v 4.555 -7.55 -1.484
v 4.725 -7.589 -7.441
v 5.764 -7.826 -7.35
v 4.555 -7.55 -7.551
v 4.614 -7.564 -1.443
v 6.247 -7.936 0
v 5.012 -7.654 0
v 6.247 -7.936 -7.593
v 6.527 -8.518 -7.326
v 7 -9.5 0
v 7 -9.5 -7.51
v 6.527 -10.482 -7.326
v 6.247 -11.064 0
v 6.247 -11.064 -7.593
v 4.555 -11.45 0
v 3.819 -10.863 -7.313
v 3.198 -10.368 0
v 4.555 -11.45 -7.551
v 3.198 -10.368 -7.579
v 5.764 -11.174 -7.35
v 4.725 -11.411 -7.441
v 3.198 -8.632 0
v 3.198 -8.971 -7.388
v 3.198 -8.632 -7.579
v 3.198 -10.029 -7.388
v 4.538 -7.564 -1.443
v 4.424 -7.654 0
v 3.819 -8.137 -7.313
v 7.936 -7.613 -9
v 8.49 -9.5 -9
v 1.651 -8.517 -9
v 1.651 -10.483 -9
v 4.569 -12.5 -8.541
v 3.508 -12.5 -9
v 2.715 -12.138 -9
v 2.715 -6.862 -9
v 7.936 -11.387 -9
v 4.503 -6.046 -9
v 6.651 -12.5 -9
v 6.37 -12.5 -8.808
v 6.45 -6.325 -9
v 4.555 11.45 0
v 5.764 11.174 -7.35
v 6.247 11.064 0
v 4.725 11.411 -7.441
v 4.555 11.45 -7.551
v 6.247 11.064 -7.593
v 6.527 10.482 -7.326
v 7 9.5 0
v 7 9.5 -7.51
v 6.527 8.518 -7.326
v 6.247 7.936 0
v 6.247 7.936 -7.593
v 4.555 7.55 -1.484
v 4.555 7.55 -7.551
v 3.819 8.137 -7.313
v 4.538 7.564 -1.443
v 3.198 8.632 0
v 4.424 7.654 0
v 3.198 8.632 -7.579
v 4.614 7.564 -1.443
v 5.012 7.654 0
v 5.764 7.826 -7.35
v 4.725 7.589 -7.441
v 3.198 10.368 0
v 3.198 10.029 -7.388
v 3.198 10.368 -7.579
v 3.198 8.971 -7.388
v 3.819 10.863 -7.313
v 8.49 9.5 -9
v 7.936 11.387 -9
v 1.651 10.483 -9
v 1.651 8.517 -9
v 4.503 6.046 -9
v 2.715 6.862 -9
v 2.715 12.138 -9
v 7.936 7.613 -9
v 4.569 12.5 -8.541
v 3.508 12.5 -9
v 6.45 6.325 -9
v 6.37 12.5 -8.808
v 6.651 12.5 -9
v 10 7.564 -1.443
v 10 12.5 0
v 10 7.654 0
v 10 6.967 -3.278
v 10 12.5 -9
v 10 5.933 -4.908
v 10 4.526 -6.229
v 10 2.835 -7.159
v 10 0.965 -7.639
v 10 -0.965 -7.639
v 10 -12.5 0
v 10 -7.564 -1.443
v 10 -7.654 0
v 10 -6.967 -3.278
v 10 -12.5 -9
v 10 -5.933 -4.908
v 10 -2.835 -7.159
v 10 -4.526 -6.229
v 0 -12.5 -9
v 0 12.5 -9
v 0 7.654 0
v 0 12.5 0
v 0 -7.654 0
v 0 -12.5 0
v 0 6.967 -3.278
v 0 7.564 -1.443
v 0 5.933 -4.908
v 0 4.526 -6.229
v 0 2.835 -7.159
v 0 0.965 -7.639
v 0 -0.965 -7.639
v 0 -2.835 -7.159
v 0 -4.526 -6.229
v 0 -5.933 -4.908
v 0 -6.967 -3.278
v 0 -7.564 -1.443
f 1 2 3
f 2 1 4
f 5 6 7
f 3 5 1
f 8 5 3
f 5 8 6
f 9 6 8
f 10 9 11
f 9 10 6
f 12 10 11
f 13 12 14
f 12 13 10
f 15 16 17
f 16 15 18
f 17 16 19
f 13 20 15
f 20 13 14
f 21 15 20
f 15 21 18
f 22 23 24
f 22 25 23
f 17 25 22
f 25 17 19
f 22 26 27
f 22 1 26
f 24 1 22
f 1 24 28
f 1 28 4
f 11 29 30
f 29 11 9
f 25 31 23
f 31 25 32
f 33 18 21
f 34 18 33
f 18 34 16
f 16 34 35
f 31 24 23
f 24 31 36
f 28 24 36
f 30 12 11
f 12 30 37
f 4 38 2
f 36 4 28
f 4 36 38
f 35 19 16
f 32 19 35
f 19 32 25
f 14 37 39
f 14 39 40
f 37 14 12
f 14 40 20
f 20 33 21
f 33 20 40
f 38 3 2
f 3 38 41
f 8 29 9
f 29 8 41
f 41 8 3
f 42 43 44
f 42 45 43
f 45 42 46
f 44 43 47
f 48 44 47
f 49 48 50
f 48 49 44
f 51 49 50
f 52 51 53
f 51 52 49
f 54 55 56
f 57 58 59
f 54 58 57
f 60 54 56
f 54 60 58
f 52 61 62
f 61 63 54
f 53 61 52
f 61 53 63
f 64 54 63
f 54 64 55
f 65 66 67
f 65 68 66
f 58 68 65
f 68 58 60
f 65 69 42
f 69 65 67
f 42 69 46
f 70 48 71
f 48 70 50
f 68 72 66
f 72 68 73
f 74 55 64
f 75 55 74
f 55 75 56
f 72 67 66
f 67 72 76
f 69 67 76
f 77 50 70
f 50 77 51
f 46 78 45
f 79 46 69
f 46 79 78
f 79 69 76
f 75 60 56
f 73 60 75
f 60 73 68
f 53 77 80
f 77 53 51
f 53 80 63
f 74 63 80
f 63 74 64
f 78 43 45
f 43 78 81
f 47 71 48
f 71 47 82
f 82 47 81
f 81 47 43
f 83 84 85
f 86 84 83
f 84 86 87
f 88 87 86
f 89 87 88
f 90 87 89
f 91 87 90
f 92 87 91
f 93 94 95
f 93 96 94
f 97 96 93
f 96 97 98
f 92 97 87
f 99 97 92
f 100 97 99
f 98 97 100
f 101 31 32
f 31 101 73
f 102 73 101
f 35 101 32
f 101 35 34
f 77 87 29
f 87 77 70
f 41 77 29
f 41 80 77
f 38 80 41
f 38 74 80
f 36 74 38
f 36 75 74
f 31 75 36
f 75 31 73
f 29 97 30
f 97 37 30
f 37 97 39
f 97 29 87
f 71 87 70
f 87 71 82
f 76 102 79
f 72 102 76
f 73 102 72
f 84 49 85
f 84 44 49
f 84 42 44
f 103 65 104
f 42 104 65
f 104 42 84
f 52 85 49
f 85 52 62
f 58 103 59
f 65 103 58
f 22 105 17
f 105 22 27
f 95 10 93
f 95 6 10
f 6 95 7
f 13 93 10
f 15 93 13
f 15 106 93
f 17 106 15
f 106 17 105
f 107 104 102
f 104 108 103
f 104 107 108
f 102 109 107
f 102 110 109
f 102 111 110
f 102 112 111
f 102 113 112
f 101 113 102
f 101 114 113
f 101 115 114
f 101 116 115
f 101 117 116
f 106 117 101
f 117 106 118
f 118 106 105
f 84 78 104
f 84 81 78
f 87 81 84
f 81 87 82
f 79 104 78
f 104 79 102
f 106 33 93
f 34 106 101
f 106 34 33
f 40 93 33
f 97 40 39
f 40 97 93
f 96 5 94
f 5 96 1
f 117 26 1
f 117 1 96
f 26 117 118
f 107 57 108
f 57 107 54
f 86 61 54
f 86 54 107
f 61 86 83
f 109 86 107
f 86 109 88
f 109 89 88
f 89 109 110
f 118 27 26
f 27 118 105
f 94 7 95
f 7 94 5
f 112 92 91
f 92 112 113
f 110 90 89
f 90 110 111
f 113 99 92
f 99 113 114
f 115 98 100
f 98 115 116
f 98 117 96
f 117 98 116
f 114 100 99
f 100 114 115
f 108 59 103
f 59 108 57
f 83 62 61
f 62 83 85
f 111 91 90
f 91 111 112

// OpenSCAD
// file: ../inc/functions.scad
// PRUSA iteration3
// Functions used in many files
// GNU GPL v3
// Josef Průša <josefprusa@me.com>
// Václav 'ax' Hůla <axtheb@gmail.com>
// Vlnofka <>
// http://www.reprap.org/wiki/Prusa_Mendel
// http://github.com/prusajr/PrusaMendel


module nut(d,h,horizontal=true){
    cornerdiameter =  (d / 2) / cos (180 / 6);
    cylinder(h = h, r = cornerdiameter, $fn = 6);
    if(horizontal){
        for(i = [1:6]){
            rotate([0,0,60*i]) translate([-cornerdiameter-0.2,0,0]) rotate([0,0,-45]) cube([2,2,h]);
        }
    }
}

module fillet(radius, height=100, $fn=0) {
    //this creates acutal fillet
    translate([-radius, -radius, -height / 2 - 0.02]) difference() {
        cube([radius * 2, radius * 2, height + 0.04]);
        if ($fn == 0 && (radius == 2 || radius == 3 || radius == 4)) {
            cylinder(r=radius, h=height + 0.04, $fn=4 * radius);
        } else {
            cylinder(r=radius, h=height + 0.04, $fn=$fn);
        }

    }
}

module cube_fillet(size, radius=-1, vertical=[3,3,3,3], top=[0,0,0,0], bottom=[0,0,0,0], center=false, $fn=0){
    //
    if (use_fillets == 1) {
        if (center) {
            cube_fillet_inside(size, radius, vertical, top, bottom, $fn);
        } else {
            translate([size[0]/2, size[1]/2, size[2]/2])
                cube_fillet_inside(size, radius, vertical, top, bottom, $fn);
        }
    } else {
        if (use_fillets == 2) {
            if (center) {
                cube_fillet_inside(size, radius, vertical, top, bottom, 4);
            } else {
                translate([size[0]/2, size[1]/2, size[2]/2])
                    cube_fillet_inside(size, radius, vertical, top, bottom, 4);
            }

        } else {
            cube(size, center);
        }
    }

}

module cube_negative_fillet(size, radius=-1, vertical=[3,3,3,3], top=[0,0,0,0], bottom=[0,0,0,0], $fn=0){

    j=[1,0,1,0];

    for (i=[0:3]) {
        if (radius > -1) {
            rotate([0, 0, 90*i]) translate([size[1-j[i]]/2, size[j[i]]/2, 0]) fillet(radius, size[2], $fn=$fn);
        } else {
            rotate([0, 0, 90*i]) translate([size[1-j[i]]/2, size[j[i]]/2, 0]) fillet(vertical[i], size[2], $fn=$fn);
        }
        rotate([90*i, -90, 0]) translate([size[2]/2, size[j[i]]/2, 0 ]) fillet(top[i], size[1-j[i]], $fn=$fn);
        rotate([90*(4-i), 90, 0]) translate([size[2]/2, size[j[i]]/2, 0]) fillet(bottom[i], size[1-j[i]], $fn=$fn);

    }
}

module cube_fillet_inside(size, radius=-1, vertical=[3,3,3,3], top=[0,0,0,0], bottom=[0,0,0,0], $fn=0){
    //makes CENTERED cube with round corners
    // if you give it radius, it will fillet vertical corners.
    //othervise use vertical, top, bottom arrays
    //when viewed from top, it starts in upper right corner (+x,+y quadrant) , goes counterclockwise
    //top/bottom fillet starts in direction of Y axis and goes CCW too


    if (radius == 0) {
        cube(size, center=true);
    } else {
        difference() {
            cube(size, center=true);
            cube_negative_fillet(size, radius, vertical, top, bottom, $fn);
        }
    }
}


module nema17(places=[1,1,1,1], size=15.5, h=10, holes=false, shadow=false, $fn=24){
    for (i=[0:3]) {
        if (places[i] == 1) {
            rotate([0, 0, 90*i]) translate([size, size, 0]) {
                if (holes) {
                    rotate([0, 0, -90*i])  translate([0,0,-10]) screw(r=1.7, slant=false, head_drop=13, $fn=$fn, h=h+12);
                } else {
                    rotate([0, 0, -90*i]) cylinder(h=h, r=5.5, $fn=$fn);
                }
            }
        }
    }
    if (shadow != false) {
        %translate ([0, 0, shadow+21+3]) cube([42,42,42], center = true);
    //flange
        %translate ([0, 0, shadow+21+3-21-1]) cylinder(r=11,h=2, center = true, $fn=20);
    //shaft
        %translate ([0, 0, shadow+21+3-21-7]) cylinder(r=2.5,h=14, center = true);
    }
}

module screw(h=20, r=2, r_head=3.5, head_drop=0, slant=i_am_box, poly=false, $fn=0){
    //makes screw with head
    //for substraction as screw hole
    if (poly) {
        cylinder_poly(h=h, r=r, $fn=$fn);
    } else {
        cylinder(h=h, r=r, $fn=$fn);
    }
    if (slant) {
        translate([0, 0, head_drop-0.01]) cylinder(h=r_head, r2=0, r1=r_head, $fn=$fn);
    }

    if (head_drop > 0) {
        translate([0, 0, -0.01]) cylinder(h=head_drop+0.01, r=r_head, $fn=$fn);
    }
}

module plate_screw(long=0) {
    if (i_am_box == 0) {
        translate([0, 0, -long]) screw(head_drop=14 + long, h=30 + long, r_head=3.6, r=1.7, $fn=24, slant=false);
    } else {
        translate([0, 0, -2 - long]) screw(head_drop=14 + long, h=30 + long, r_head=4.5, r=2, $fn=24, slant=true);
    }
}

//radius of the idler assembly (to surface that touches belt, ignoring guide walls)
function idler_assy_r_inner(idler_bearing) = (idler_bearing[0] / 2) + (6 * single_wall_width + 0.2) * idler_bearing[3];
//outer radius of the idler assembly (to smooth side of belt) 
function idler_assy_r_outer(idler_bearing) = idler_assy_r_inner(idler_bearing) + belt_thickness + 1;


module idler_assy(idler_bearing = [22, 7, 8, 1]) {

    //bearing axle
    translate([0,0,-1]) cylinder(h = 120, r=(idler_bearing[2] + 1) / 2, $fn=small_hole_segments, center=true);
    //bearing shadow
    %cylinder(h = idler_bearing[1], r=idler_bearing[0]/2, center=true);
    //belt shadow
    %cylinder(h = belt_width, r=idler_assy_r_outer(idler_bearing), center=true);

    cylinder(h = idler_width + 1, r=idler_assy_r_outer(idler_bearing) + 0.5, center=true);
}

module belt(len, side = 0){
    //belt. To be substracted from model
    //len is in +Z, smooth side in +X, Y centered
    translate([-0.5, 0, 0]) maketeeth(len);
    translate([0, -4.5, -0.01]) cube([belt_thickness, 9, len + 0.02]);
    if (side != 0) {
    translate([0, -4.5 + side, -0.01]) cube_fillet([belt_thickness, 9, len + 0.02], vertical = [3, 0, 0, 0]);
    }
}


module maketeeth(len){
    //Belt teeth. 
    for (i = [0 : len / belt_tooth_distance]) {
        translate([0, 0, i * belt_tooth_distance]) cube([2, 9, belt_tooth_distance * belt_tooth_ratio], center = true);
    }
}
// file: ../inc/conf_bushing.scad
// PRUSA iteration3
// Bushing and bering dimensions
// GNU GPL v3
// Václav 'ax' Hůla <axtheb@gmail.com>
// http://www.reprap.org/wiki/Prusa_Mendel
// http://github.com/prusajr/PrusaMendel
//

// each config is in form[r_rod, r, h, type, name] where:
//     r_rod  is smooth rod radius [0]
//     r is outer bushing radius needed for tight fit or bearing radius with loose fit [1]
//     h is barrel length [2]
//     type is 0 for linear bearings, 1 is for bushings which needs to be enclosed fully. [3]
//       type 1 may have flange, but type 0 not
//     name is human readable name [4]

//bushings
conf_b_bushing8 = [4, 5.1, 10, 1, "Tube shaped bushing like igus J(V)FM 0810-10"];
conf_b_bushing10 = [5, 6.1, 10, 1, "Tube shaped bushing with id=10mm, od=12mm and length of at least 10mm, like J(V)FM 1012-10"];
conf_b_bushing12 = [6, 7.1, 15, 1, "Tube shaped bushing with id=12mm, od=14mm and length of at least 15mm, like SF-1 1215"];

conf_b_bronze8 = [4, 8, 11, 1, "bronze self-aligning bushing, 8mm"];

//shorter beaings (two on each Z axis)
conf_b_lm8uu = [4, 7.7, 24, 0, "lm8uu bearing (standard)"];
conf_b_lm10uu = [5, 9.7, 29, 0, "lm10uu bearing (10mm smooth rod)"];
conf_b_lme8uu =[4, 8.2, 25, 0, "lme8uu bearing"];
conf_b_lm12uu = [6, 10.6, 30, 0, "lm12uu bearing (12mm smooth rod)"];

//longer bearings
conf_b_lm8luu = [4, 7.7, 45, 0, "lm8luu bearing (double length)"];
conf_b_lm10luu = [5, 9.7, 55, 0, "lm10luu bearing (10mm smooth rod, long)"];
conf_b_lm12luu = [6, 10.6, 57, 0, "lm12luu bearing (12mm, double length)"];


// Select idler bearing size **************************************************
// [outer_diameter, width, inner_diameter, uses_guide]

// roughly sorted by desirability

// one bearing with guides
// Select by availability, smaller is better.
bearing_623 = [10, 4, 3, 1, "623 bearing"];
bearing_624 = [13, 5, 4, 1, "624 bearing"];
bearing_625 = [16, 5, 5, 1, "625 bearing"];

// two bearings side by side - for use without bearing guides.
// Not recomended anymore
bearing_625_double = [16, 10, 5, 0, "625 bearing x2"];
bearing_624_double = [13, 10, 4, 0, "624 bearing x2"];
bearing_623_double = [10, 8, 3, 0, "623 bearing"];

// 608 [standard skate bearings] with bearing guide
bearing_608 = [22, 7, 8, 1, "608 bearing"];
// 608 bearings with fender washers.
// the belt brushes both against the carriage and the washers.
bearing_608_washers = [22, 10, 8, 0, "608 bearing"];
// file: ../inc/metric.scad
// PRUSA iteration3
// Default metric sizes
// GNU GPL v3
// Josef Průša <josefprusa@me.com>
// http://www.reprap.org/wiki/Prusa_Mendel
// http://github.com/prusajr/PrusaMendel

// DONT CHANGE THIS FILE! ALTER VALUES IN CONFIGURATION.SCAD INSTEAD

// RODS

threaded_rod_diameter = 8.7;
threaded_rod_diameter_horizontal = 8.7;
smooth_bar_diameter = 8;
smooth_bar_diameter_horizontal = 8.5;

// Nuts and bolts

m8_diameter = 9;
m8_nut_diameter = 14.1;

m4_diameter = 4.5;
m4_nut_diameter = 9;
m4_nut_diameter_horizontal = 10;

m3_diameter = 3.6;
m3_nut_diameter = 5.3;
m3_nut_diameter_horizontal = 6.8;
m3_washer_diameter = 6.9;

// Motors

motor_shaft = 5.5;
// file: ../configuration.scad
// PRUSA iteration3
// Configuration file
// GNU GPL v3
// Josef Průša <josefprusa@me.com>
// Václav 'ax' Hůla <axtheb@gmail.com>
// http://www.reprap.org/wiki/Prusa_Mendel
// http://github.com/prusajr/PrusaMendel

include <inc/metric.scad>;
include <inc/conf_bushing.scad>;

// Custom settings here, tailor to your supplies and print settings


// Extruder settings **********************************************************
// Don't forget to set your slicer's extruder settings to match the values you
// enter here.

layer_height = 0.3;
// Width over thickness determines how wide the plastic will be when extruded
// onto the object that is being printed. width_over_thickness is multiplied
// by the layer_height to calculate this width. i.e. If your layer_height is
// set to 0.3 mm and your width_over_thickness is set to 2.2, the resulting
// width will be 0.66 mm.
width_over_thickness = 2.2;

// Select your belt type ******************************************************

//T2.5
//belt_tooth_distance = 2.5;
//belt_tooth_ratio = 0.75;

//T5 (strongly discouraged)
//belt_tooth_distance = 5;
//belt_tooth_ratio = 0.75;

//HTD3
belt_tooth_distance = 3;
belt_tooth_ratio = 0.75;

//MXL
//belt_tooth_distance = 2.032;
//belt_tooth_ratio = 0.64;

//GT2 there is bunch of GT2 belts with different tooth-to-tooth distance
//adjust to your needs
//belt_tooth_distance = 2;
//belt_tooth_ratio = 0.5;

// For T type belts you will probably want 0.8mm or so.
belt_thickness = 1.75;

// Choose bearing/bushing configuration ***************************************
// conf_b_* are in inc/conf_bushing.scad

bushing_xy = conf_b_lm12luu;
bushing_z = conf_b_lm12luu;
// for longer bearings use one shorter in x-carriage to make place for belt attachment
// by default use same as xy
bushing_carriage = conf_b_lm12uu;

// Select idler bearing size **************************************************
// [outer_diameter, width, inner_diameter, uses_guide]
// 608 [standard skate bearings] with bearing guide
bearing_608 = [22, 7, 8, 1];
// 608 bearings with fender washers. Not good at all, the belt brushes against the carriage
bearing_608_washers = [22, 10, 8, 0];
// one 625 with guides
bearing_625 = [16, 5, 5, 1];
// two 625 - for use without bearing guides.
bearing_625_double = [16, 10, 5, 0];

// those two here are really good:
bearing_624_double = [13, 10, 4, 0];
// this one has roughly same diameter as pulley, makes belt parallel so its prettier
bearing_623_double = [10, 8, 3, 0];

idler_bearing = bearing_624_double;

// Select carriage lenght ******************************************************
// 30 for single carriage extruder (two holes with centers 30mm apart)
// 50 for wade or single with fan (three holes, 30-20)
// 80 for full length carriage (four holes, 30-20-30)

carriage_l_base = 80;

// Fillets ********************************************************************
// fillets are rounded corners of boxes. The right engineering term is probably radius
// but cad software calls it fillet.
// mostly cosmetic, except z axis.
// 0 = no fillets
// 1 = fillet
// 2 = chamfer (cut the edges at 45deg. angle)
// Please do put only parts with fillets on sale, other options are not really tested

use_fillets = 1;

// set to 0 for single plate (affects z axis and screws that attach RP parts to frame)
i_am_box = 1;

// if you do your own plate and can move bottom Z screws 5mm up set this to 0 to
// get stronger motor mount. Only for i_am_box = 0
i_want_to_use_single_plate_dxf_and_make_my_z_weaker = 1;


// Radius of long threaded rod on Y frame

// Affects y-axis-corner (both box and single plate)
// and y-axis-bracket (box only)

//Use 5.4 for M10 or 4.4 for M8
y_threaded_rod_long_r = 5.4;


// Thickness of the boards that make the box frame.

// in y-axis-corner it governs the height of the corners by adjusting the
// distance between ground and M10 threaded rod. (both box and single plate)

// For box model, the parts that hold Z smooth rod have one hole from front
// and one from side, and this setting makes sure that the screw from side
// is in the center of the plank.

// Use 12 for single plate
// or 20 if you want to use the Y lm8uu holders 
// (extras/bearing-holder-single-plate-y)
board_thickness = 18;

// Segments of small holes. some poeple claim that a low value makes them easier to print.
small_hole_segments=7;


// END of custom settings *****************************************************


// You are not supposed to change this
board_to_xz_distance = 26;
xaxis_rod_distance = 45;

//calculated from settings
single_wall_width = width_over_thickness * layer_height;

idler_width = (idler_bearing[1] > 7 ? idler_bearing[1] : 7) + 2.5 * idler_bearing[3] ;

//deltas are used to enlarge parts for bigger bearings 
xy_delta = ((bushing_xy[1] <= 7.7) ? 0 : bushing_xy[1] - 7.7) * 0.9;
z_delta = (bushing_z[1] <= 7.7) ? 0 : bushing_z[1] - 7.7;

// CHANGE ONLY THE STUFF YOU KNOW
// IT WILL REPLACE DEFAULT SETTING

// RODS

// threaded_rod_diameter = 0;
// threaded_rod_diameter_horizontal = 0;
// smooth_bar_diameter = 0;
// smooth_bar_diameter_horizontal = 0;

// Nuts and bolts

// m8_diameter = 0;
// m8_nut_diameter = 0;

// m4_diameter = 0;
// m4_nut_diameter = 0;

// m3_diameter = 0;
// m3_nut_diameter = 0;

// Bushing holder

// bushing_core_diameter = smooth_bar_diameter;
// bushing_material_thickness = 0;

///counted stuff
m3_nut_diameter_bigger = ((m3_nut_diameter  / 2) / cos (180 / 6))*2;

// functions
include <inc/functions.scad>

// These constants define the geometry of the complete-printer.scad

//x_smooth_rod_length=325;
//y_smooth_rod_length=405;
//z_smooth_rod_length=235;
bed_x_size=225;
bed_y_size=225;

x_smooth_rod_length=460+board_thickness*2; // 492 for 16mm thickness; 484 for 12mm thickness
y_smooth_rod_length=470;
z_smooth_rod_length=405;
// main file
//Part that fixes bearings to alu Y plate. For us ziptie haters;)
/// use with M3x20 countersunk screws
// GNU GPL v3
// Václav 'ax' Hůla <axtheb@gmail.com>
include <../configuration.scad>;

module bearingholdersingleplate(){
difference(){
    translate([0, -25/2, 0]) cube([10, 25, 9]);
    translate([-1, 0, 0]) rotate([0,90,0]) cylinder(r=7.7, h=21);
    mirror([0, 0, 1]) translate([5, -19/2, -9]) screw();
    mirror([0, 0, 1]) translate([5, 19/2, -9]) screw();
}
}


mirror([0, 0, 1]) bearingholdersingleplate();
